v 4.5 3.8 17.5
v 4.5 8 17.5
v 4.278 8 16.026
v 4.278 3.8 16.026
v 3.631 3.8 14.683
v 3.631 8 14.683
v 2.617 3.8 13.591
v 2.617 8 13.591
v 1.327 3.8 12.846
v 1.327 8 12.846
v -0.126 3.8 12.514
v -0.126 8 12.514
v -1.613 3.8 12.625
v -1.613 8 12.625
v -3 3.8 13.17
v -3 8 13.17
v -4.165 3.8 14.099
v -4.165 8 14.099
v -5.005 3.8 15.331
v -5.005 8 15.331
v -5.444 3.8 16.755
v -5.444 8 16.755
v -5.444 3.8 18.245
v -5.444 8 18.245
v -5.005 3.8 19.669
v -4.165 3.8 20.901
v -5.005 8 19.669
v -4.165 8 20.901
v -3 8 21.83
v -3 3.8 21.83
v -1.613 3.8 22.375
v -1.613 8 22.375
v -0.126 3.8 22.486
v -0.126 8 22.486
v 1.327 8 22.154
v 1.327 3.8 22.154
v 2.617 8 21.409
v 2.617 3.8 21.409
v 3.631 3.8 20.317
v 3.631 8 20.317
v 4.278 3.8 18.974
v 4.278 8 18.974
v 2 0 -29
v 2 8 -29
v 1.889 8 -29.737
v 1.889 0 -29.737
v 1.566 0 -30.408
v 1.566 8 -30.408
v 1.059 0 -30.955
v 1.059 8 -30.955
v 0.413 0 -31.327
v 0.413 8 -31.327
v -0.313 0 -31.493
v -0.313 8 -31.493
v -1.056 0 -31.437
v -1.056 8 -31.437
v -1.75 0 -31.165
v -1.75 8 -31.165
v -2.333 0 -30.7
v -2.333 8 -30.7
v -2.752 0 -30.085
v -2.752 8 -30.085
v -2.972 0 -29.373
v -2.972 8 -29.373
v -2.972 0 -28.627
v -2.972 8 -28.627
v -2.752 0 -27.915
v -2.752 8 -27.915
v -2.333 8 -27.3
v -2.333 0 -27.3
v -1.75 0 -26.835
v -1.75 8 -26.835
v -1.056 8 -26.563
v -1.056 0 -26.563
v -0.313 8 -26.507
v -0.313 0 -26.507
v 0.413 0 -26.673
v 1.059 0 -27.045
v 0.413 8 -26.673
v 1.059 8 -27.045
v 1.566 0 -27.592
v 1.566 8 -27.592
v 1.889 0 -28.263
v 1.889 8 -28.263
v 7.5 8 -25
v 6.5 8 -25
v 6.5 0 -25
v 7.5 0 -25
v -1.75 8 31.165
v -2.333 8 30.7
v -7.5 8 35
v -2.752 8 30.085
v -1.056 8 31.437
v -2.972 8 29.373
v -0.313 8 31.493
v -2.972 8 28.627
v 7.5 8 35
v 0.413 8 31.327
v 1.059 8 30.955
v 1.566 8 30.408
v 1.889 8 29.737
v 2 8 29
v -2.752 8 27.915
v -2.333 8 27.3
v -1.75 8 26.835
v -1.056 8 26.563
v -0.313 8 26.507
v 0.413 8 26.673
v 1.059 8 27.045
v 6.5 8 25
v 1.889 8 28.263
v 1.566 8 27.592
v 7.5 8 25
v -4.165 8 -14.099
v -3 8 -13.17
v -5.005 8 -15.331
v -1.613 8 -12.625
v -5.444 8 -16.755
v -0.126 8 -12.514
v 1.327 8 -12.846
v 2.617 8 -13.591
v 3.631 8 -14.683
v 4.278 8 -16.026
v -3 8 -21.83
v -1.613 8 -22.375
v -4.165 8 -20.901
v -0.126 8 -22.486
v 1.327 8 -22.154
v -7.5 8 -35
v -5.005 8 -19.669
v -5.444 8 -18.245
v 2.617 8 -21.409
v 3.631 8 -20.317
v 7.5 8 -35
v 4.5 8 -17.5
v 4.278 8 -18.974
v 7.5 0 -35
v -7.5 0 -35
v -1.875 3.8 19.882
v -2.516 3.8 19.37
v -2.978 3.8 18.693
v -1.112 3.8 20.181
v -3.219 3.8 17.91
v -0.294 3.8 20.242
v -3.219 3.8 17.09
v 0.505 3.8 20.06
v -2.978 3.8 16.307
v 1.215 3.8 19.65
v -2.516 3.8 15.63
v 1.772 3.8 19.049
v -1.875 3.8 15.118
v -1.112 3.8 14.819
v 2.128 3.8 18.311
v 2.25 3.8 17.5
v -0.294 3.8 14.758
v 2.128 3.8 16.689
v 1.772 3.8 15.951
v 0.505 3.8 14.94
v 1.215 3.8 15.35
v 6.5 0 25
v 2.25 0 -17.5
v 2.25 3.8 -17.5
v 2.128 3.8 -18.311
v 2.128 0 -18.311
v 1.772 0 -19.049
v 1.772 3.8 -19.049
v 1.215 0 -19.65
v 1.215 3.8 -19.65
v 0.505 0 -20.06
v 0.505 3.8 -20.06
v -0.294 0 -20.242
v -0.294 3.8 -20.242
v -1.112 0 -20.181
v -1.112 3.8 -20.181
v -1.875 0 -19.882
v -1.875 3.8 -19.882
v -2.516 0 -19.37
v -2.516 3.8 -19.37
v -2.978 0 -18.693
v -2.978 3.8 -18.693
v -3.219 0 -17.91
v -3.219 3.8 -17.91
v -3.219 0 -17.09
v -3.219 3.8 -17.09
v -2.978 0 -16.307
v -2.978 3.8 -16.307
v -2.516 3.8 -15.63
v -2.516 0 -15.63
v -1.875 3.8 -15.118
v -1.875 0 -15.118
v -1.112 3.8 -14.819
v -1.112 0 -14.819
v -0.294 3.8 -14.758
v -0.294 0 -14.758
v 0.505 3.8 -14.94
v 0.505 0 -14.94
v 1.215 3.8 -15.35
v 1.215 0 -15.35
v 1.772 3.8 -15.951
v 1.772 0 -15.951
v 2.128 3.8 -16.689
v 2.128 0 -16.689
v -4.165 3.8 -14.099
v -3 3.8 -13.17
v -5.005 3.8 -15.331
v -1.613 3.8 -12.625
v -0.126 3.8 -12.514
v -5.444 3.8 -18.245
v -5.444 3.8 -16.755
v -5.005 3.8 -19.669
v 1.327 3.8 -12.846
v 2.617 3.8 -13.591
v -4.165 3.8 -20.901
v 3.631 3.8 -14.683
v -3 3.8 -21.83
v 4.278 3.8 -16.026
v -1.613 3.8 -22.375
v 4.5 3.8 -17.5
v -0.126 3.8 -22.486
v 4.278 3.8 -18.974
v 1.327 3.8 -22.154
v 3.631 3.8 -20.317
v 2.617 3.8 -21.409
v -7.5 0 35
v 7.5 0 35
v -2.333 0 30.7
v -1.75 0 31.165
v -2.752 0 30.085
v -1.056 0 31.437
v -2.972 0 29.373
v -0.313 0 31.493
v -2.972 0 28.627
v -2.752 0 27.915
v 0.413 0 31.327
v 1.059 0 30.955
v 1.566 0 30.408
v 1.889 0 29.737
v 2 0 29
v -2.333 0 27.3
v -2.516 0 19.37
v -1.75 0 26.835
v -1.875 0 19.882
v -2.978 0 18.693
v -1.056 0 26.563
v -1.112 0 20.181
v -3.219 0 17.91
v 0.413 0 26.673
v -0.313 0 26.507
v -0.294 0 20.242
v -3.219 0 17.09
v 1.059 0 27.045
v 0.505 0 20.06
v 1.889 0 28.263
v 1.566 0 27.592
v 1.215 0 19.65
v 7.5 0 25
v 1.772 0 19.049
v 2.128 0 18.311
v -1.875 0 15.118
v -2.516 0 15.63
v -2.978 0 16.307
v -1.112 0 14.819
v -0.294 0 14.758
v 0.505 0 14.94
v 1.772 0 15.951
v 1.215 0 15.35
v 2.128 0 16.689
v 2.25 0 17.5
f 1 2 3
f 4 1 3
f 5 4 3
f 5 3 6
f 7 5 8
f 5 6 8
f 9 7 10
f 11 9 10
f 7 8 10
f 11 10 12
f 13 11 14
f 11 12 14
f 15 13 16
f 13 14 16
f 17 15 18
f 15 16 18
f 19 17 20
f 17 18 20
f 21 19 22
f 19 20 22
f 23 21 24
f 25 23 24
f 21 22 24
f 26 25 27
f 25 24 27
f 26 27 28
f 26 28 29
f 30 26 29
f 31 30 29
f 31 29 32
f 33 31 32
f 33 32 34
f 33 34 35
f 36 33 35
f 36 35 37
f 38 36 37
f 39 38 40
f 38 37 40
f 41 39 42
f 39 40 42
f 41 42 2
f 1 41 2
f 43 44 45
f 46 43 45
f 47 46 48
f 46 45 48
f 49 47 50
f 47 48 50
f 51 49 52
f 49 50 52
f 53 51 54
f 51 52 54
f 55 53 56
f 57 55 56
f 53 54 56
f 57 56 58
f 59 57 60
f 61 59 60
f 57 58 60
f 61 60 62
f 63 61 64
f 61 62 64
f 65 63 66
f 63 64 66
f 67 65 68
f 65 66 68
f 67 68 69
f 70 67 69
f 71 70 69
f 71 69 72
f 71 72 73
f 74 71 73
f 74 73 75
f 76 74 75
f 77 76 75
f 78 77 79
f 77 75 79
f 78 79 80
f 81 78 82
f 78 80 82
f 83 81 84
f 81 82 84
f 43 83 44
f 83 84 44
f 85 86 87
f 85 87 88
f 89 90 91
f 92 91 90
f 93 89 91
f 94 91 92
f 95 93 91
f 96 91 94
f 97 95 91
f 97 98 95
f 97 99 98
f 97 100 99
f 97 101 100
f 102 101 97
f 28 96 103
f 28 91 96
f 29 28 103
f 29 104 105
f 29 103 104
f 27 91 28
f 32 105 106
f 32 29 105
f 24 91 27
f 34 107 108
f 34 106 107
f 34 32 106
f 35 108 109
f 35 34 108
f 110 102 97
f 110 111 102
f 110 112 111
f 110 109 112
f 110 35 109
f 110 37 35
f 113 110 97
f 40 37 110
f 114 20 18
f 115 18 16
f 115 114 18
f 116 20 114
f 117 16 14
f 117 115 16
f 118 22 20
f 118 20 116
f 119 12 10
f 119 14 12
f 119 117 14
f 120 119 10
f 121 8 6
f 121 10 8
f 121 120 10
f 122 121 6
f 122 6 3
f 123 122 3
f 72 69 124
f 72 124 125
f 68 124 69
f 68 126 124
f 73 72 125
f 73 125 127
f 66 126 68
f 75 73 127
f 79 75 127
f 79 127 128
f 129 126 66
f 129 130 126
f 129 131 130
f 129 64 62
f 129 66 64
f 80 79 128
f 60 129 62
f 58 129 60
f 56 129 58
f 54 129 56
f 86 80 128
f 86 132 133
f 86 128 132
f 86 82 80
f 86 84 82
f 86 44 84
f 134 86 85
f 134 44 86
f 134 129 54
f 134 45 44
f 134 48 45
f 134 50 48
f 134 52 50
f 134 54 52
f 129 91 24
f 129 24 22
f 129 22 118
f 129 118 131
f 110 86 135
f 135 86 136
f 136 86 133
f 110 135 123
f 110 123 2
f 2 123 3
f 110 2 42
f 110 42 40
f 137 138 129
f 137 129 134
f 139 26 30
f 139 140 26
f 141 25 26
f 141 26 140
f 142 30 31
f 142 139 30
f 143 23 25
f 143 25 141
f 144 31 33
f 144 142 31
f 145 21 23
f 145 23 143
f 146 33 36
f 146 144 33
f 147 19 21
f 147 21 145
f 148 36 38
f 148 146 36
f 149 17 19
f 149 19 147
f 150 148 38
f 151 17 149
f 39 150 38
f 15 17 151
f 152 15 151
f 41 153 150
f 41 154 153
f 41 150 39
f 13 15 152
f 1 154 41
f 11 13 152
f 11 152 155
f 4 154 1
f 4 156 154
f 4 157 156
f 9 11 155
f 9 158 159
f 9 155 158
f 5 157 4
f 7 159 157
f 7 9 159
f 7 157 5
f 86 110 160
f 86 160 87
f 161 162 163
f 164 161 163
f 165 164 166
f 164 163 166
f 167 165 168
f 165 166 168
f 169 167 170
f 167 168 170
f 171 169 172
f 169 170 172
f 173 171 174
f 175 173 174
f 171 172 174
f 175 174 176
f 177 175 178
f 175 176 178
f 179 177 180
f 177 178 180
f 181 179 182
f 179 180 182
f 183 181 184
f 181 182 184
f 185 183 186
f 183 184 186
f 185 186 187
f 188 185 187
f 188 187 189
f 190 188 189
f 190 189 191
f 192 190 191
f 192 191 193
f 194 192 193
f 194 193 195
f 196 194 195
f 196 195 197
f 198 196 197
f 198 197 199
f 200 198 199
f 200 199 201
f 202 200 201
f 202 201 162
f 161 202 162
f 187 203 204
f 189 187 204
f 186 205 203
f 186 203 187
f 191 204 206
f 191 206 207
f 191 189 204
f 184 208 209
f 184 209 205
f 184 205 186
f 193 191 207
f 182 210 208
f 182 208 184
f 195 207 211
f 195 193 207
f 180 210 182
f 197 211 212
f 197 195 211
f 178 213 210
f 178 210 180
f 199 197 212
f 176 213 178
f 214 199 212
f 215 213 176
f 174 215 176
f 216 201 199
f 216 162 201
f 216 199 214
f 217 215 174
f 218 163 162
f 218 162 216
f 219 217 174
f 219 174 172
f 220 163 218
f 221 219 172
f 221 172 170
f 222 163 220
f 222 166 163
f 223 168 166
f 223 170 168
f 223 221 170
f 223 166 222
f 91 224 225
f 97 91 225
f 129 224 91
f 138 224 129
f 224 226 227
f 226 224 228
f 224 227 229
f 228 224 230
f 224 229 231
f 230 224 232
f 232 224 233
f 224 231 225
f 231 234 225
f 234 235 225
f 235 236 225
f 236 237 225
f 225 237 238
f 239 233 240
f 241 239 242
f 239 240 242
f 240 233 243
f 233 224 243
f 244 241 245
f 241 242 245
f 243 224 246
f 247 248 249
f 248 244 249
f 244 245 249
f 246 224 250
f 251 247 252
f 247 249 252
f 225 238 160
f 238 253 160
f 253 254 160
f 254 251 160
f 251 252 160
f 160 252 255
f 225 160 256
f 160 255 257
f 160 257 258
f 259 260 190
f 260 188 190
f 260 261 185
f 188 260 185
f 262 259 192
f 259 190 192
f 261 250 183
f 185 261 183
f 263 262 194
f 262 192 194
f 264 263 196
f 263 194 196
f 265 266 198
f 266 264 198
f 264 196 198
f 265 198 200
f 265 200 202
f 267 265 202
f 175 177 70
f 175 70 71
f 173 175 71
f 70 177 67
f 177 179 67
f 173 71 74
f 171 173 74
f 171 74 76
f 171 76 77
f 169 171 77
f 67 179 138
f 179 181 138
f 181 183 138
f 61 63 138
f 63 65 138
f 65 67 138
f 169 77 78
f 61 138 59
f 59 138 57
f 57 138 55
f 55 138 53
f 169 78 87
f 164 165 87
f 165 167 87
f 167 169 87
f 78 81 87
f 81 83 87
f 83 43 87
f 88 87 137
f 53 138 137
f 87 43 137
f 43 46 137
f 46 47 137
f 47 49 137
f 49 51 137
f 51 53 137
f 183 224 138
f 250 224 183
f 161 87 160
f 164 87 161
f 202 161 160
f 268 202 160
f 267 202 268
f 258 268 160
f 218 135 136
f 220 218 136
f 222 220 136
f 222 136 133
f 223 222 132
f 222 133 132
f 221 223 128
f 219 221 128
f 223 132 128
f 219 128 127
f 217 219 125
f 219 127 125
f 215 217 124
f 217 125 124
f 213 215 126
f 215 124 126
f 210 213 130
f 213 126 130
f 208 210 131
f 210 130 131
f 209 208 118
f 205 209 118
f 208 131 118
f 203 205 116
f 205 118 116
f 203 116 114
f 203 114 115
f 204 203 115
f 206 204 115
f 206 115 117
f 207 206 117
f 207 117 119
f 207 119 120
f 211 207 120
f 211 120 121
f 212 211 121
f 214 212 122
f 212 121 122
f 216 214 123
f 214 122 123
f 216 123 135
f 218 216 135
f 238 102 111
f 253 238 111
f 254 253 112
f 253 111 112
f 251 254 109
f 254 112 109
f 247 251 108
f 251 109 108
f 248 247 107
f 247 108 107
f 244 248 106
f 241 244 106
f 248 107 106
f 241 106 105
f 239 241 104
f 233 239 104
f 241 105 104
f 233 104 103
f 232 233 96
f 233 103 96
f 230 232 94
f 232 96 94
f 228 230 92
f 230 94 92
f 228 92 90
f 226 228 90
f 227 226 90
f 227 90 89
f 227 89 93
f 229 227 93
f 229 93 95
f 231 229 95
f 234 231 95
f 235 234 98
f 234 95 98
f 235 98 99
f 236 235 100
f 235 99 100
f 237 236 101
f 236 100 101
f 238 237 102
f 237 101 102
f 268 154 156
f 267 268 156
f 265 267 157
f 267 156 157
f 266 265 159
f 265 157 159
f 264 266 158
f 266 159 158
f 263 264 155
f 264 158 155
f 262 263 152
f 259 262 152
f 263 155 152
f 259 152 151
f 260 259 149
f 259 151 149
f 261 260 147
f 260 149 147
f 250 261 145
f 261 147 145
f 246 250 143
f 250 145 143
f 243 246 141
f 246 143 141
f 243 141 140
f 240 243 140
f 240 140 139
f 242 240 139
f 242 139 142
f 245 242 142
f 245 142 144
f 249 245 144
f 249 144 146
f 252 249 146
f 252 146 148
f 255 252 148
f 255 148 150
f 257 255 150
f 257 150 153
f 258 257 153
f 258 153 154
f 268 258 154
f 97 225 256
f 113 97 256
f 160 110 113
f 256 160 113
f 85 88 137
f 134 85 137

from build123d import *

# Parameters (mm, degrees)
SKETCH1_W           = 15
SKETCH1_H           = 70
BOSS_EXTRUDE1_DEPTH = 8
SKETCH2_W           = 1
SKETCH2_H           = 50
CUT_EXTRUDE1_DEPTH  = 8
SKETCH3_R           = 2.5
CUT_EXTRUDE2_DEPTH  = 8
SKETCH4_R           = 2.75
CUT_EXTRUDE3_DEPTH  = 8
SKETCH5_R           = 5
CUT_EXTRUDE4_DEPTH  = 4.2


with BuildPart() as part:
    # Sketch1 → Boss-Extrude1 (new body)
    with BuildSketch(Plane(origin=(0, 0, 0), x_dir=(1, 0, 0), z_dir=(0, 1, 0))):
        Rectangle(SKETCH1_W, SKETCH1_H)
    extrude(amount=BOSS_EXTRUDE1_DEPTH)

    # Sketch2 → Cut-Extrude1 (cut)
    with BuildSketch(Plane(origin=(0, 8, 0), x_dir=(1, 0, 0), z_dir=(0, 1, 0))):
        with Locations((7, 0)):
            Rectangle(SKETCH2_W, SKETCH2_H)
    extrude(amount=-CUT_EXTRUDE1_DEPTH, mode=Mode.SUBTRACT)

    # Sketch3 → Cut-Extrude2 (cut)
    with BuildSketch(Plane(origin=(0, 8, 0), x_dir=(1, 0, 0), z_dir=(0, 1, 0))):
        with Locations((-0.5, -29)):
            Circle(SKETCH3_R)
        with Locations((-0.5, 29)):
            Circle(SKETCH3_R)
    extrude(amount=-CUT_EXTRUDE2_DEPTH, mode=Mode.SUBTRACT)

    # Sketch4 → Cut-Extrude3 (cut)
    with BuildSketch(Plane(origin=(0, 8, 0), x_dir=(1, 0, 0), z_dir=(0, 1, 0))):
        with Locations((-0.5, -17.5)):
            Circle(SKETCH4_R)
        with Locations((-0.5, 17.5)):
            Circle(SKETCH4_R)
    extrude(amount=-CUT_EXTRUDE3_DEPTH, mode=Mode.SUBTRACT)

    # Sketch5 → Cut-Extrude4 (cut)
    with BuildSketch(Plane(origin=(0, 8, 0), x_dir=(1, 0, 0), z_dir=(0, 1, 0))):
        with Locations((-0.5, 17.5)):
            Circle(SKETCH5_R)
        with Locations((-0.5, -17.5)):
            Circle(SKETCH5_R)
    extrude(amount=-CUT_EXTRUDE4_DEPTH, mode=Mode.SUBTRACT)


solid = part.part
